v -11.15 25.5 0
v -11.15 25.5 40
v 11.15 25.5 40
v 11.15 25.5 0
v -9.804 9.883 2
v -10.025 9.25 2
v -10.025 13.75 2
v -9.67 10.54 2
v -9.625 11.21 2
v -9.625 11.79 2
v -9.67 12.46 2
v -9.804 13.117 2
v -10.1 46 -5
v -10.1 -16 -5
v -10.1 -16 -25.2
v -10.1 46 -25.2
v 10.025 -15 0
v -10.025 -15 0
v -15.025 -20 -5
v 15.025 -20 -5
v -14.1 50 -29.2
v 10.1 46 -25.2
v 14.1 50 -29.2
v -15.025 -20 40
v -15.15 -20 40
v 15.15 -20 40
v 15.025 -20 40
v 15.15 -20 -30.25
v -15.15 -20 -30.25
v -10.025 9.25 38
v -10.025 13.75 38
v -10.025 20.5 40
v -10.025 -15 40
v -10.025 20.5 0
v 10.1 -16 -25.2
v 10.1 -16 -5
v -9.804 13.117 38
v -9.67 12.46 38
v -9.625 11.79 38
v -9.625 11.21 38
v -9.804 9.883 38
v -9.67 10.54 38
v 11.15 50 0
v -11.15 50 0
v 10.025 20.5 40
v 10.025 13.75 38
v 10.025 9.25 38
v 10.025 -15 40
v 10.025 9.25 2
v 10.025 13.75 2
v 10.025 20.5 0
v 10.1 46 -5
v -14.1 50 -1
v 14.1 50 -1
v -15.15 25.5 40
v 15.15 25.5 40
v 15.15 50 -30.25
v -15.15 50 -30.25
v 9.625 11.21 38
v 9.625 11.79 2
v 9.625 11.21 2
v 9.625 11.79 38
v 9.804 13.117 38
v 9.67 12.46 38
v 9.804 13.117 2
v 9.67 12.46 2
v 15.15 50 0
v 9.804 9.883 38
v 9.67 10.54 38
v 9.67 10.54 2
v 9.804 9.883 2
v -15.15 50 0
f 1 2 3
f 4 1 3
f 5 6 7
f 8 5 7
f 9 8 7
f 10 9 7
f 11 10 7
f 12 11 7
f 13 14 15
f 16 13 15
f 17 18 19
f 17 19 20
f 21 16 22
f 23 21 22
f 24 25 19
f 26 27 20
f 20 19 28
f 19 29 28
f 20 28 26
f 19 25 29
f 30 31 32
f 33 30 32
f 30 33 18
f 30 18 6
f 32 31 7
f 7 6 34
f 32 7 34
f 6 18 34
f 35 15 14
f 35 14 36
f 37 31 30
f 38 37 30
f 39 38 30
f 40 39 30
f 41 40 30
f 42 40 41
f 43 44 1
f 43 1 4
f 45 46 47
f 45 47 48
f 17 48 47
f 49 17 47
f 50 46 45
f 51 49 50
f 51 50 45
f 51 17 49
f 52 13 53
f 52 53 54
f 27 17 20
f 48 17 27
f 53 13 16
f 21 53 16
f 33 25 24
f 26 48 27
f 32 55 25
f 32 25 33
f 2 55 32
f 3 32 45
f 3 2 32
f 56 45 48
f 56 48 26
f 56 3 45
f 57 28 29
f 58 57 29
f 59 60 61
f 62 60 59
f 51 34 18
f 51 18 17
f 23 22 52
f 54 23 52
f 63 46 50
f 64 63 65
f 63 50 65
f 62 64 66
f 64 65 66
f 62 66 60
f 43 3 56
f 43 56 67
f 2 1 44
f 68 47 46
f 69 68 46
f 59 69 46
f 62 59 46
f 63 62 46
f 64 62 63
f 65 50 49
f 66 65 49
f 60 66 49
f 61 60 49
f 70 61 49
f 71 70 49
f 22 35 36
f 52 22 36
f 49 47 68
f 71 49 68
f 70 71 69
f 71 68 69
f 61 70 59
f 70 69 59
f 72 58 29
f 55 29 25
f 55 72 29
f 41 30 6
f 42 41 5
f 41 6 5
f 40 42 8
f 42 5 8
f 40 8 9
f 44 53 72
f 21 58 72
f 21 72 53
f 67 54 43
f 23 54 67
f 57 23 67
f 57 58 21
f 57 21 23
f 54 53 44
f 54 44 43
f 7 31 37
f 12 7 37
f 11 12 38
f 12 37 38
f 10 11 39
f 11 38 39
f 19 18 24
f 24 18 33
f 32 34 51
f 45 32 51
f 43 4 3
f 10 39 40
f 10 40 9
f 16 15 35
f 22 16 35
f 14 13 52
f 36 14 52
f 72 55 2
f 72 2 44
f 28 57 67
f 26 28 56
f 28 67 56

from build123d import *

# Parameters (mm, degrees)
CROQUIS2_W               = 30.3
CROQUIS2_H               = 70
SALIENTE_EXTRUIR2_DEPTH  = 5
SALIENTE_EXTRUIR3_START  = -20
SALIENTE_EXTRUIR3_DEPTH  = 70
SALIENTE_EXTRUIR4_START  = -20
CROQUIS4_W               = 20.2
CROQUIS4_H               = 20.2
SALIENTE_EXTRUIR4_DEPTH  = 4
CHAFL_N4_SIZE            = 4
CROQUIS6_W               = 30.3
CROQUIS6_H               = 5
CROQUIS6_W_2             = 5.125
CROQUIS6_H_2             = 40.5
SALIENTE_EXTRUIR6_DEPTH  = 40
SALIENTE_EXTRUIR7_START  = -15.15
SALIENTE_EXTRUIR7_DEPTH  = 30.3
CROQUIS8_W               = 22.3
CROQUIS8_H               = 24.5
CORTAR_EXTRUIR1_DEPTH    = 40
CHAFL_N9_SIZE            = 5
SALIENTE_EXTRUIR9_DEPTH  = 0.4
REDONDEO3_R              = 5
SALIENTE_EXTRUIR10_DEPTH = 0.4
REDONDEO4_R              = 5


with BuildPart() as part:
    # Croquis2 → Saliente-Extruir2 (new body)
    with BuildSketch(Plane.XY):
        with Locations((0, 15)):
            Rectangle(CROQUIS2_W, CROQUIS2_H)
    extrude(amount=-SALIENTE_EXTRUIR2_DEPTH)

    # Croquis3 → Saliente-Extruir3 (add)
    with BuildSketch(Plane(origin=(0, 0, 0), x_dir=(1, 0, 0), z_dir=(0, 1, 0)).offset(SALIENTE_EXTRUIR3_START)):
        Polygon((-15.15, 30.25), (-15.15, 5), (-10.1, 5), (-10.1, 25.2), (10.1, 25.2), (10.1, 5), (15.15, 5), (15.15, 30.25), align=None)
    extrude(amount=SALIENTE_EXTRUIR3_DEPTH)

    # Croquis4 → Saliente-Extruir4 (add)
    with BuildSketch(Plane(origin=(0, 0, 0), x_dir=(1, 0, 0), z_dir=(0, 1, 0)).offset(SALIENTE_EXTRUIR4_START)):
        with Locations((0, 15.1)):
            Rectangle(CROQUIS4_W, CROQUIS4_H)
    extrude(amount=SALIENTE_EXTRUIR4_DEPTH)

    # Chaflán4
    chafl_n4_edges = [part.edges().sort_by_distance(p)[0] for p in [
        (0, 50, -5),
        (10.1, 50, -15.1),
        (0, 50, -25.2),
        (-10.1, 50, -15.1),
    ]]
    chamfer(chafl_n4_edges, length=CHAFL_N4_SIZE)

    # Croquis6 → Saliente-Extruir6 (add)
    with BuildSketch(Plane.XY):
        with Locations((0, 23)):
            Rectangle(CROQUIS6_W, CROQUIS6_H)
        with Locations((-12.5875, 0.25)):
            Rectangle(CROQUIS6_W_2, CROQUIS6_H_2)
        with Locations((12.5875, 0.25)):
            Rectangle(CROQUIS6_W_2, CROQUIS6_H_2)
    extrude(amount=SALIENTE_EXTRUIR6_DEPTH)

    # Croquis7 → Saliente-Extruir7 (add)
    with BuildSketch(Plane(origin=(0, 0, 0), x_dir=(0, 0, -1), z_dir=(1, 0, 0)).offset(SALIENTE_EXTRUIR7_START)):
        Polygon((-40, 25.5), (0, 50), (0, 25.5), align=None)
    extrude(amount=SALIENTE_EXTRUIR7_DEPTH)

    # Croquis8 → Cortar-Extruir1 (cut)
    with BuildSketch(Plane.XY):
        with Locations((0, 37.75)):
            Rectangle(CROQUIS8_W, CROQUIS8_H)
    extrude(amount=CORTAR_EXTRUIR1_DEPTH, mode=Mode.SUBTRACT)

    # Chaflán9
    chafl_n9_edges = [part.edges().sort_by_distance(p)[0] for p in [
        (0, -20, 0),
        (-10.025, -20, 20),
        (10.025, -20, 20),
    ]]
    chamfer(chafl_n9_edges, length=CHAFL_N9_SIZE)

    # Croquis22 → Saliente-Extruir9 (add)
    with BuildSketch(Plane(origin=(-10.025, 0, 0), x_dir=(0, 0, -1), z_dir=(1, 0, 0))):
        Polygon((-2, 13.75), (-10, 13.75), (-30, 13.75), (-38, 13.75), (-38, 9.25), (-30, 9.25), (-10, 9.25), (-2, 9.25), align=None)
    extrude(amount=SALIENTE_EXTRUIR9_DEPTH)

    # Redondeo3
    # the kernel refuses this fillet: 5 mm, written as the material it takes off along each edge
    with BuildSketch(Plane(origin=(-9.625, 9.25, 2), x_dir=(-1, 0, 0), z_dir=(0, 0, 1)), Plane(origin=(-9.625, 13.75, 42.898979486), x_dir=(-1, 0, 0), z_dir=(0, 0, -1))) as redondeo3_piece_1:
        with BuildLine():
            CenterArc((5, -1.959591794), REDONDEO3_R, 156.926081934, 23.073918066)
            Line((0, -1.959591794), (0, 0))
            Line((0, 0), (0.4, 0))
        make_face()
    extrude(amount=40.898979486, mode=Mode.SUBTRACT)

    # Croquis26 → Saliente-Extruir10 (add)
    with BuildSketch(Plane.ZY.offset(-10.025)):
        Polygon((10, 13.75), (2, 13.75), (2, 9.25), (10, 9.25), (30, 9.25), (38, 9.25), (38, 13.75), (30, 13.75), align=None)
    extrude(amount=SALIENTE_EXTRUIR10_DEPTH)

    # Redondeo4
    # the kernel refuses this fillet: 5 mm, written as the material it takes off along each edge
    with BuildSketch(Plane(origin=(9.625, 9.25, 42.898979486), x_dir=(1, 0, 0), z_dir=(0, 0, -1)), Plane(origin=(9.625, 13.75, 2), x_dir=(1, 0, 0), z_dir=(0, 0, 1))) as redondeo4_piece_1:
        with BuildLine():
            CenterArc((5, -1.959591794), REDONDEO4_R, 156.926081934, 23.073918066)
            Line((0, -1.959591794), (0, 0))
            Line((0, 0), (0.4, 0))
        make_face()
    extrude(amount=40.898979486, mode=Mode.SUBTRACT)


solid = part.part
